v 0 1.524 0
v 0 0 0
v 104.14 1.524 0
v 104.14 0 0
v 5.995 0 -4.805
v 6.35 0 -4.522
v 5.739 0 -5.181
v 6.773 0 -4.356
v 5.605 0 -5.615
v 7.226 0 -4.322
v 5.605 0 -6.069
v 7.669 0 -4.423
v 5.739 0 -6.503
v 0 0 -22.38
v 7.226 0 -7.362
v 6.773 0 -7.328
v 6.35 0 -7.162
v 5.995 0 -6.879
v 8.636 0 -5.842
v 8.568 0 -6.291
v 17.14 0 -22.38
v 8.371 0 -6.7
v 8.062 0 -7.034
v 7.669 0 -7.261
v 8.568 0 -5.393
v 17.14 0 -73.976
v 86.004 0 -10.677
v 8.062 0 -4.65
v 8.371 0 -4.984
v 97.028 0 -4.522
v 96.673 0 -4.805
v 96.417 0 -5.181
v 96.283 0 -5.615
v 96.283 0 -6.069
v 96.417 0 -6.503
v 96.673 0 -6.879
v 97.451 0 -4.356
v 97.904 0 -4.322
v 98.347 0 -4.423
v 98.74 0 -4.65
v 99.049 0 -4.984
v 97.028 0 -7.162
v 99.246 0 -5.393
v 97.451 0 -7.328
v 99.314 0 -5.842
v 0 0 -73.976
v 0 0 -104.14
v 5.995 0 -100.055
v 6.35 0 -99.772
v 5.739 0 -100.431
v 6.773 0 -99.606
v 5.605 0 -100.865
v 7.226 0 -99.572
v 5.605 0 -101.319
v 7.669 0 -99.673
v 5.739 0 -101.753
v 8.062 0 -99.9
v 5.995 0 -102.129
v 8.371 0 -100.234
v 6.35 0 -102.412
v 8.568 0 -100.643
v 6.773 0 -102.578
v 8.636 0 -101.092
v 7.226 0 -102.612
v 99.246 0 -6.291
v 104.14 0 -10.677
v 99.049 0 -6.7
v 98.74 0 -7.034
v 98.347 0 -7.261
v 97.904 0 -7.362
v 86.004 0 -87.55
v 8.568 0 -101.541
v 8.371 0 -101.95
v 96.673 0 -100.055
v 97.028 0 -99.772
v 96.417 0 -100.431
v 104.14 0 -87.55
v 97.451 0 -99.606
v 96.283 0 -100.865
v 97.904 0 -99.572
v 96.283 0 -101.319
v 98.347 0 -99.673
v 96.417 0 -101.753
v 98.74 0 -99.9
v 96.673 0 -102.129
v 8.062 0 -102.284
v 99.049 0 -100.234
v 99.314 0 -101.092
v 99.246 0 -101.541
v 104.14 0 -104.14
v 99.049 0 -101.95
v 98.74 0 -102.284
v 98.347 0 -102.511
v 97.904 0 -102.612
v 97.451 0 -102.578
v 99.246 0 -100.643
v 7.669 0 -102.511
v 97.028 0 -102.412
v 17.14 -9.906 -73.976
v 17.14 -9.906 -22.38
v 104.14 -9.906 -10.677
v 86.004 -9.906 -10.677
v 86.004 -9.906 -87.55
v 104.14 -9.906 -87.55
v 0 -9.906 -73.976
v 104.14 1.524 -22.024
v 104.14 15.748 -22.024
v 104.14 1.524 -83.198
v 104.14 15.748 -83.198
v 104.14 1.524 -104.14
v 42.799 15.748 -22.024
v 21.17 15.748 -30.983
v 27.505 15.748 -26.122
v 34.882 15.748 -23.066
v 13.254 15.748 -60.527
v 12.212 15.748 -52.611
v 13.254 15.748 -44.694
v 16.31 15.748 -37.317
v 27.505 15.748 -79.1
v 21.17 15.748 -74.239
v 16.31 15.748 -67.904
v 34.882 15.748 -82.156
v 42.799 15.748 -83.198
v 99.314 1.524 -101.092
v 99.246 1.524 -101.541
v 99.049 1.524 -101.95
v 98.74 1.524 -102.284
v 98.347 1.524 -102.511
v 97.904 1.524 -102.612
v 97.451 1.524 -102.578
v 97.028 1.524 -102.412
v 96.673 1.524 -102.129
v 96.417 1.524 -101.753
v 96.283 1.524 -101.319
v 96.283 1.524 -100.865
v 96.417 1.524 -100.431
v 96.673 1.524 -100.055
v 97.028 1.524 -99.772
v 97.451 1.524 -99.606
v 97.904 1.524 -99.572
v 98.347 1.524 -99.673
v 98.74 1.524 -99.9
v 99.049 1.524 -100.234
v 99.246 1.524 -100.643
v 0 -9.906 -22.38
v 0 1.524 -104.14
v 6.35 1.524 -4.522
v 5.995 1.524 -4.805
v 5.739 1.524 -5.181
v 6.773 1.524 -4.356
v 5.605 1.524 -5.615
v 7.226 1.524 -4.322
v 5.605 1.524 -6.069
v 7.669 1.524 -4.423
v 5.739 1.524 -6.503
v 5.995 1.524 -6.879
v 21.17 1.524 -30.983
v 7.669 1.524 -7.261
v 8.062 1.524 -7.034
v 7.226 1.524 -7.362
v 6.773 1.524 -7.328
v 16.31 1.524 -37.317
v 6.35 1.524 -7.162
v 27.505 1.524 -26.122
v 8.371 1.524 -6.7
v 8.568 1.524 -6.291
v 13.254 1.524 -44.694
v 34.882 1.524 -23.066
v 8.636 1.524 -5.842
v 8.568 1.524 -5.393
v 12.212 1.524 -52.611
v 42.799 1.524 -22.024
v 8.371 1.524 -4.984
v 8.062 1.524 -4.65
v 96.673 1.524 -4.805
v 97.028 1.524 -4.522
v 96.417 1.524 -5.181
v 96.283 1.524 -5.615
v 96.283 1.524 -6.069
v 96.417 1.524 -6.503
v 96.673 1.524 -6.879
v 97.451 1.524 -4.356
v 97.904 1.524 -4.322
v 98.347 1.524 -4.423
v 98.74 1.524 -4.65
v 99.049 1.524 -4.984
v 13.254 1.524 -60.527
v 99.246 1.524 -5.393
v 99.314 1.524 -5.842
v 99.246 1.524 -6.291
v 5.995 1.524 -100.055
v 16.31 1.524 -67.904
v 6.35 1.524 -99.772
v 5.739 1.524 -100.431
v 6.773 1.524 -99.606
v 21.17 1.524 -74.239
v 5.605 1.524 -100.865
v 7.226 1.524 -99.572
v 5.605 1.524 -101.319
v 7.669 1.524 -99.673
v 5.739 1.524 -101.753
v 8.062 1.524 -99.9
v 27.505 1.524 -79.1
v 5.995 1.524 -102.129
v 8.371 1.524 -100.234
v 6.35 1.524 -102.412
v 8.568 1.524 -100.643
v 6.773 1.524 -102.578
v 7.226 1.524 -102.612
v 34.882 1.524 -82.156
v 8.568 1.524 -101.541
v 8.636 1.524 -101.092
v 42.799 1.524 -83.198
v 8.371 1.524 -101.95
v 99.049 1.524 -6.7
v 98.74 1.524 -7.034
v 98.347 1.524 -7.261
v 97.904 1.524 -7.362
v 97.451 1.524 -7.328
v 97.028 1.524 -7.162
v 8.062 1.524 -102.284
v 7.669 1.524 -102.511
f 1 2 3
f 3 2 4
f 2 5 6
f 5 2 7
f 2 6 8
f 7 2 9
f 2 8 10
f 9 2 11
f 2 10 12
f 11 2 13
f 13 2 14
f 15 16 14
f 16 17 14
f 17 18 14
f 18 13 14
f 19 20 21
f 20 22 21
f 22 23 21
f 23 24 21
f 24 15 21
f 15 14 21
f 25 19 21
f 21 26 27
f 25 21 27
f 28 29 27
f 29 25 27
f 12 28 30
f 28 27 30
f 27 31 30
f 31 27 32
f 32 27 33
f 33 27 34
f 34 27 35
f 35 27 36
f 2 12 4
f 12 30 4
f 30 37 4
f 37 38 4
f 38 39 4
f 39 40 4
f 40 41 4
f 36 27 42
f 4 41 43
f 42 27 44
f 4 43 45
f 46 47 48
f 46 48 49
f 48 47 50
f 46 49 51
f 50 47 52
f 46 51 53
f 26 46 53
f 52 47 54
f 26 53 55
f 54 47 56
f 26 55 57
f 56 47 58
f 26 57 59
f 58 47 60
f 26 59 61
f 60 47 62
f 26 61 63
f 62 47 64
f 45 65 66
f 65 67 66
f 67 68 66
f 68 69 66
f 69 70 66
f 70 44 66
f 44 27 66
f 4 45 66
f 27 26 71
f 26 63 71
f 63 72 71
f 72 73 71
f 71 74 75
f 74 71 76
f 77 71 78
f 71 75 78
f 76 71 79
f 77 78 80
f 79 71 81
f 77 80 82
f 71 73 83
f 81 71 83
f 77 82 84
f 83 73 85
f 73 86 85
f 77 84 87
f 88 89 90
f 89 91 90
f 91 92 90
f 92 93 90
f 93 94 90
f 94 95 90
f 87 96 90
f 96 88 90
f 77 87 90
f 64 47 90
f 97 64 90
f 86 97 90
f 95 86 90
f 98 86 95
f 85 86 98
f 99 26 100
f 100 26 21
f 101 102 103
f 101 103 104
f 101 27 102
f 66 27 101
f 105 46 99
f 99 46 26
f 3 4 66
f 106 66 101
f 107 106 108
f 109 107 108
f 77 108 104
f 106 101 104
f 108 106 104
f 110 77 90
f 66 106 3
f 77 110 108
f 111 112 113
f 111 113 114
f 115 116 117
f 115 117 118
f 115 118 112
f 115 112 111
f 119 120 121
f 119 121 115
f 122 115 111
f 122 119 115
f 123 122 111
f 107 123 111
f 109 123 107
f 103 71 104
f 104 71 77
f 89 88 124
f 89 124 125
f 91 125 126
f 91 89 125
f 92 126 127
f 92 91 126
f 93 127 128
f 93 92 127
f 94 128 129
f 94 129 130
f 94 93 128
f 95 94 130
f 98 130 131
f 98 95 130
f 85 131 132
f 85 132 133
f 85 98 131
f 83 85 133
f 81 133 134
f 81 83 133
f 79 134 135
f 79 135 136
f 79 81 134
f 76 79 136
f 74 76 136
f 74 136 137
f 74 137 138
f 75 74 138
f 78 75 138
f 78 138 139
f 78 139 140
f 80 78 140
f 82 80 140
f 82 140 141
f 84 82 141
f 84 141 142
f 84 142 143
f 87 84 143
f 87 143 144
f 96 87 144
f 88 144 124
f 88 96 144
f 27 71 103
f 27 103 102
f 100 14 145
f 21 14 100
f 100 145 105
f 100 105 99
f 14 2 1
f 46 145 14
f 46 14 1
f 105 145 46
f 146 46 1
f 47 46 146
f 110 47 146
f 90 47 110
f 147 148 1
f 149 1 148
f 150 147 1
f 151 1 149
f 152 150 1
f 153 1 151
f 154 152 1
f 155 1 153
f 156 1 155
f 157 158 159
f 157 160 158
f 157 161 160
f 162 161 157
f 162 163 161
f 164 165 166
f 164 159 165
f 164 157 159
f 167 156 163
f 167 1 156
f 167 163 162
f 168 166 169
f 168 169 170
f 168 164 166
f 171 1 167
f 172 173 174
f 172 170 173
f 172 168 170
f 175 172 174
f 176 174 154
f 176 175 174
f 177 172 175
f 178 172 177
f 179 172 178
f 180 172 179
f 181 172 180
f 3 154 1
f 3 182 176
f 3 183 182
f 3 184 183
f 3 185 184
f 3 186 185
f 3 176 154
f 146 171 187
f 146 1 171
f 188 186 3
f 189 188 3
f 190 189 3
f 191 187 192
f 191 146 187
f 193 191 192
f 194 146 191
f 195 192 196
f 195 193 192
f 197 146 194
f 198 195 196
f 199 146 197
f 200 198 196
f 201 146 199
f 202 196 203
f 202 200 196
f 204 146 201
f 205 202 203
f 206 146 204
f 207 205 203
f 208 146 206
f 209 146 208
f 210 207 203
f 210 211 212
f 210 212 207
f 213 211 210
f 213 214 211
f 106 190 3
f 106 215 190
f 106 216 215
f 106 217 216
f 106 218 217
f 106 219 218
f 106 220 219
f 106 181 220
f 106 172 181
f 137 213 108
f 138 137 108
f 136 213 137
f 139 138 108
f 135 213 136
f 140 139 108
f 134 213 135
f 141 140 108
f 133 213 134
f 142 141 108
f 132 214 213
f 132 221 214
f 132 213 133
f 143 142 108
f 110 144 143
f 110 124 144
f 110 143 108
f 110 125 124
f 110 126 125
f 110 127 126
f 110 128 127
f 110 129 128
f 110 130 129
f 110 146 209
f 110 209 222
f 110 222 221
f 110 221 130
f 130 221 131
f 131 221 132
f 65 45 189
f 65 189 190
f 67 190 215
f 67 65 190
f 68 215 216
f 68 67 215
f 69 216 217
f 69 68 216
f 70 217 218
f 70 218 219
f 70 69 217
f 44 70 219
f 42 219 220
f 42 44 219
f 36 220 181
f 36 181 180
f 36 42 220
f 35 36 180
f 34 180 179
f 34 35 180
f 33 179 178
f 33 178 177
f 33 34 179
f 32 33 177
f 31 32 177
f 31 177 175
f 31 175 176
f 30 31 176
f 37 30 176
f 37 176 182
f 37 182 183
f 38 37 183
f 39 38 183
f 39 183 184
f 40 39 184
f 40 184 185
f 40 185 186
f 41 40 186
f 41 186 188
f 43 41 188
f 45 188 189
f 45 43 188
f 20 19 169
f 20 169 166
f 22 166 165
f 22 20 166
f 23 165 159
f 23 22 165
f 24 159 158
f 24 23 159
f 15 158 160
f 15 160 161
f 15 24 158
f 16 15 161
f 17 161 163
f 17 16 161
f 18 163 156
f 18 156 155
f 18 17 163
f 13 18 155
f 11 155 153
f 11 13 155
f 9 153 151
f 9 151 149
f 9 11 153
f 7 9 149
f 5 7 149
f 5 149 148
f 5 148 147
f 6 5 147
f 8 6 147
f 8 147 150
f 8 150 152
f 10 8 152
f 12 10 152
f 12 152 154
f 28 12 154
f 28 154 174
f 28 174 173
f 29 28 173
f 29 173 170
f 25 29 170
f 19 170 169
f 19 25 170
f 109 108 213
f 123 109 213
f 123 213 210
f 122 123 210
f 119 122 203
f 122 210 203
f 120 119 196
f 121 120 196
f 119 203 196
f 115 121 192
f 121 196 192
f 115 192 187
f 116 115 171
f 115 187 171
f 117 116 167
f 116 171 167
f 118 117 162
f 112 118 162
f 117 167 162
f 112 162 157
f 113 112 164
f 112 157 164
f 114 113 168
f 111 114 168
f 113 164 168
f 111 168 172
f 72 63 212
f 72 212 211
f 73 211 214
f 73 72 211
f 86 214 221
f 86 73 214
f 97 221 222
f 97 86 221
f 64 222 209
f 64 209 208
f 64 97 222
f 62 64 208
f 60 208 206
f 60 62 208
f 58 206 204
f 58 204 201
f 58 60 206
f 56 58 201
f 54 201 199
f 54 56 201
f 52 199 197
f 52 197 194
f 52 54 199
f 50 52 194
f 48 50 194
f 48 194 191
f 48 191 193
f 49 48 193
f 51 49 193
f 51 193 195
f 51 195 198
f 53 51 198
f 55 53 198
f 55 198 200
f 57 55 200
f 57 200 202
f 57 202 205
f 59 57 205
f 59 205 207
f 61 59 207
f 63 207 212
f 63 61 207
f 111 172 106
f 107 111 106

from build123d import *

# Parameters (mm, degrees)
SKETCH1_W           = 104.14
SKETCH1_H           = 104.14
SKETCH1_R           = 1.524
BOSS_EXTRUDE1_DEPTH = 1.524
BOSS_EXTRUDE2_DEPTH = 14.224
SKETCH3_W           = 18.136210303
SKETCH3_H           = 76.873137305
BOSS_EXTRUDE3_DEPTH = 9.906
SKETCH5_W           = 17.139817269
SKETCH5_H           = 51.595631098
BOSS_EXTRUDE4_DEPTH = 9.906


with BuildPart() as part:
    # Sketch1 → Boss-Extrude1 (new body)
    with BuildSketch(Plane(origin=(0, 0, 0), x_dir=(1, 0, 0), z_dir=(0, 1, 0))):
        with Locations((52.07, 52.07)):
            Rectangle(SKETCH1_W, SKETCH1_H)
        with Locations((7.112, 101.092)):
            Circle(SKETCH1_R, mode=Mode.SUBTRACT)
        with Locations((97.79, 101.092)):
            Circle(SKETCH1_R, mode=Mode.SUBTRACT)
        with Locations((7.112, 5.842)):
            Circle(SKETCH1_R, mode=Mode.SUBTRACT)
        with Locations((97.79, 5.842)):
            Circle(SKETCH1_R, mode=Mode.SUBTRACT)
    extrude(amount=BOSS_EXTRUDE1_DEPTH)

    # Sketch2 → Boss-Extrude2 (add)
    with BuildSketch(Plane(origin=(0, 1.524, 0), x_dir=(1, 0, 0), z_dir=(0, 1, 0))):
        with BuildLine():
            Line((104.14, 22.024034198), (104.14, 83.197819697))
            Line((104.14, 83.197819697), (42.798644119, 83.197819697))
            ThreePointArc((42.798644119, 83.197819697), (64.426843398, 74.239126226), (73.385536869, 52.610926948))
            ThreePointArc((73.385536869, 52.610926948), (64.426843398, 30.982727669), (42.798644119, 22.024034198))
            Line((42.798644119, 22.024034198), (104.14, 22.024034198))
        make_face()
        with BuildLine():
            ThreePointArc((73.385536869, 52.610926948), (64.426843398, 74.239126226), (42.798644119, 83.197819697))
            Line((42.798644119, 83.197819697), (42.798644119, 22.024034198))
            ThreePointArc((42.798644119, 22.024034198), (64.426843398, 30.982727669), (73.385536869, 52.610926948))
        make_face()
        with BuildLine():
            Line((42.798644119, 22.024034198), (42.798644119, 83.197819697))
            ThreePointArc((42.798644119, 83.197819697), (12.211751369, 52.610926948), (42.798644119, 22.024034198))
        make_face()
    extrude(amount=BOSS_EXTRUDE2_DEPTH)

    # Sketch3 → Boss-Extrude3 (add)
    with BuildSketch(Plane.XZ):
        with Locations((95.071894848, -49.113594912)):
            Rectangle(SKETCH3_W, SKETCH3_H)
    extrude(amount=BOSS_EXTRUDE3_DEPTH)

    # Sketch5 → Boss-Extrude4 (add)
    with BuildSketch(Plane.XZ):
        with Locations((8.569908635, -48.177785321)):
            Rectangle(SKETCH5_W, SKETCH5_H)
    extrude(amount=BOSS_EXTRUDE4_DEPTH)


solid = part.part
